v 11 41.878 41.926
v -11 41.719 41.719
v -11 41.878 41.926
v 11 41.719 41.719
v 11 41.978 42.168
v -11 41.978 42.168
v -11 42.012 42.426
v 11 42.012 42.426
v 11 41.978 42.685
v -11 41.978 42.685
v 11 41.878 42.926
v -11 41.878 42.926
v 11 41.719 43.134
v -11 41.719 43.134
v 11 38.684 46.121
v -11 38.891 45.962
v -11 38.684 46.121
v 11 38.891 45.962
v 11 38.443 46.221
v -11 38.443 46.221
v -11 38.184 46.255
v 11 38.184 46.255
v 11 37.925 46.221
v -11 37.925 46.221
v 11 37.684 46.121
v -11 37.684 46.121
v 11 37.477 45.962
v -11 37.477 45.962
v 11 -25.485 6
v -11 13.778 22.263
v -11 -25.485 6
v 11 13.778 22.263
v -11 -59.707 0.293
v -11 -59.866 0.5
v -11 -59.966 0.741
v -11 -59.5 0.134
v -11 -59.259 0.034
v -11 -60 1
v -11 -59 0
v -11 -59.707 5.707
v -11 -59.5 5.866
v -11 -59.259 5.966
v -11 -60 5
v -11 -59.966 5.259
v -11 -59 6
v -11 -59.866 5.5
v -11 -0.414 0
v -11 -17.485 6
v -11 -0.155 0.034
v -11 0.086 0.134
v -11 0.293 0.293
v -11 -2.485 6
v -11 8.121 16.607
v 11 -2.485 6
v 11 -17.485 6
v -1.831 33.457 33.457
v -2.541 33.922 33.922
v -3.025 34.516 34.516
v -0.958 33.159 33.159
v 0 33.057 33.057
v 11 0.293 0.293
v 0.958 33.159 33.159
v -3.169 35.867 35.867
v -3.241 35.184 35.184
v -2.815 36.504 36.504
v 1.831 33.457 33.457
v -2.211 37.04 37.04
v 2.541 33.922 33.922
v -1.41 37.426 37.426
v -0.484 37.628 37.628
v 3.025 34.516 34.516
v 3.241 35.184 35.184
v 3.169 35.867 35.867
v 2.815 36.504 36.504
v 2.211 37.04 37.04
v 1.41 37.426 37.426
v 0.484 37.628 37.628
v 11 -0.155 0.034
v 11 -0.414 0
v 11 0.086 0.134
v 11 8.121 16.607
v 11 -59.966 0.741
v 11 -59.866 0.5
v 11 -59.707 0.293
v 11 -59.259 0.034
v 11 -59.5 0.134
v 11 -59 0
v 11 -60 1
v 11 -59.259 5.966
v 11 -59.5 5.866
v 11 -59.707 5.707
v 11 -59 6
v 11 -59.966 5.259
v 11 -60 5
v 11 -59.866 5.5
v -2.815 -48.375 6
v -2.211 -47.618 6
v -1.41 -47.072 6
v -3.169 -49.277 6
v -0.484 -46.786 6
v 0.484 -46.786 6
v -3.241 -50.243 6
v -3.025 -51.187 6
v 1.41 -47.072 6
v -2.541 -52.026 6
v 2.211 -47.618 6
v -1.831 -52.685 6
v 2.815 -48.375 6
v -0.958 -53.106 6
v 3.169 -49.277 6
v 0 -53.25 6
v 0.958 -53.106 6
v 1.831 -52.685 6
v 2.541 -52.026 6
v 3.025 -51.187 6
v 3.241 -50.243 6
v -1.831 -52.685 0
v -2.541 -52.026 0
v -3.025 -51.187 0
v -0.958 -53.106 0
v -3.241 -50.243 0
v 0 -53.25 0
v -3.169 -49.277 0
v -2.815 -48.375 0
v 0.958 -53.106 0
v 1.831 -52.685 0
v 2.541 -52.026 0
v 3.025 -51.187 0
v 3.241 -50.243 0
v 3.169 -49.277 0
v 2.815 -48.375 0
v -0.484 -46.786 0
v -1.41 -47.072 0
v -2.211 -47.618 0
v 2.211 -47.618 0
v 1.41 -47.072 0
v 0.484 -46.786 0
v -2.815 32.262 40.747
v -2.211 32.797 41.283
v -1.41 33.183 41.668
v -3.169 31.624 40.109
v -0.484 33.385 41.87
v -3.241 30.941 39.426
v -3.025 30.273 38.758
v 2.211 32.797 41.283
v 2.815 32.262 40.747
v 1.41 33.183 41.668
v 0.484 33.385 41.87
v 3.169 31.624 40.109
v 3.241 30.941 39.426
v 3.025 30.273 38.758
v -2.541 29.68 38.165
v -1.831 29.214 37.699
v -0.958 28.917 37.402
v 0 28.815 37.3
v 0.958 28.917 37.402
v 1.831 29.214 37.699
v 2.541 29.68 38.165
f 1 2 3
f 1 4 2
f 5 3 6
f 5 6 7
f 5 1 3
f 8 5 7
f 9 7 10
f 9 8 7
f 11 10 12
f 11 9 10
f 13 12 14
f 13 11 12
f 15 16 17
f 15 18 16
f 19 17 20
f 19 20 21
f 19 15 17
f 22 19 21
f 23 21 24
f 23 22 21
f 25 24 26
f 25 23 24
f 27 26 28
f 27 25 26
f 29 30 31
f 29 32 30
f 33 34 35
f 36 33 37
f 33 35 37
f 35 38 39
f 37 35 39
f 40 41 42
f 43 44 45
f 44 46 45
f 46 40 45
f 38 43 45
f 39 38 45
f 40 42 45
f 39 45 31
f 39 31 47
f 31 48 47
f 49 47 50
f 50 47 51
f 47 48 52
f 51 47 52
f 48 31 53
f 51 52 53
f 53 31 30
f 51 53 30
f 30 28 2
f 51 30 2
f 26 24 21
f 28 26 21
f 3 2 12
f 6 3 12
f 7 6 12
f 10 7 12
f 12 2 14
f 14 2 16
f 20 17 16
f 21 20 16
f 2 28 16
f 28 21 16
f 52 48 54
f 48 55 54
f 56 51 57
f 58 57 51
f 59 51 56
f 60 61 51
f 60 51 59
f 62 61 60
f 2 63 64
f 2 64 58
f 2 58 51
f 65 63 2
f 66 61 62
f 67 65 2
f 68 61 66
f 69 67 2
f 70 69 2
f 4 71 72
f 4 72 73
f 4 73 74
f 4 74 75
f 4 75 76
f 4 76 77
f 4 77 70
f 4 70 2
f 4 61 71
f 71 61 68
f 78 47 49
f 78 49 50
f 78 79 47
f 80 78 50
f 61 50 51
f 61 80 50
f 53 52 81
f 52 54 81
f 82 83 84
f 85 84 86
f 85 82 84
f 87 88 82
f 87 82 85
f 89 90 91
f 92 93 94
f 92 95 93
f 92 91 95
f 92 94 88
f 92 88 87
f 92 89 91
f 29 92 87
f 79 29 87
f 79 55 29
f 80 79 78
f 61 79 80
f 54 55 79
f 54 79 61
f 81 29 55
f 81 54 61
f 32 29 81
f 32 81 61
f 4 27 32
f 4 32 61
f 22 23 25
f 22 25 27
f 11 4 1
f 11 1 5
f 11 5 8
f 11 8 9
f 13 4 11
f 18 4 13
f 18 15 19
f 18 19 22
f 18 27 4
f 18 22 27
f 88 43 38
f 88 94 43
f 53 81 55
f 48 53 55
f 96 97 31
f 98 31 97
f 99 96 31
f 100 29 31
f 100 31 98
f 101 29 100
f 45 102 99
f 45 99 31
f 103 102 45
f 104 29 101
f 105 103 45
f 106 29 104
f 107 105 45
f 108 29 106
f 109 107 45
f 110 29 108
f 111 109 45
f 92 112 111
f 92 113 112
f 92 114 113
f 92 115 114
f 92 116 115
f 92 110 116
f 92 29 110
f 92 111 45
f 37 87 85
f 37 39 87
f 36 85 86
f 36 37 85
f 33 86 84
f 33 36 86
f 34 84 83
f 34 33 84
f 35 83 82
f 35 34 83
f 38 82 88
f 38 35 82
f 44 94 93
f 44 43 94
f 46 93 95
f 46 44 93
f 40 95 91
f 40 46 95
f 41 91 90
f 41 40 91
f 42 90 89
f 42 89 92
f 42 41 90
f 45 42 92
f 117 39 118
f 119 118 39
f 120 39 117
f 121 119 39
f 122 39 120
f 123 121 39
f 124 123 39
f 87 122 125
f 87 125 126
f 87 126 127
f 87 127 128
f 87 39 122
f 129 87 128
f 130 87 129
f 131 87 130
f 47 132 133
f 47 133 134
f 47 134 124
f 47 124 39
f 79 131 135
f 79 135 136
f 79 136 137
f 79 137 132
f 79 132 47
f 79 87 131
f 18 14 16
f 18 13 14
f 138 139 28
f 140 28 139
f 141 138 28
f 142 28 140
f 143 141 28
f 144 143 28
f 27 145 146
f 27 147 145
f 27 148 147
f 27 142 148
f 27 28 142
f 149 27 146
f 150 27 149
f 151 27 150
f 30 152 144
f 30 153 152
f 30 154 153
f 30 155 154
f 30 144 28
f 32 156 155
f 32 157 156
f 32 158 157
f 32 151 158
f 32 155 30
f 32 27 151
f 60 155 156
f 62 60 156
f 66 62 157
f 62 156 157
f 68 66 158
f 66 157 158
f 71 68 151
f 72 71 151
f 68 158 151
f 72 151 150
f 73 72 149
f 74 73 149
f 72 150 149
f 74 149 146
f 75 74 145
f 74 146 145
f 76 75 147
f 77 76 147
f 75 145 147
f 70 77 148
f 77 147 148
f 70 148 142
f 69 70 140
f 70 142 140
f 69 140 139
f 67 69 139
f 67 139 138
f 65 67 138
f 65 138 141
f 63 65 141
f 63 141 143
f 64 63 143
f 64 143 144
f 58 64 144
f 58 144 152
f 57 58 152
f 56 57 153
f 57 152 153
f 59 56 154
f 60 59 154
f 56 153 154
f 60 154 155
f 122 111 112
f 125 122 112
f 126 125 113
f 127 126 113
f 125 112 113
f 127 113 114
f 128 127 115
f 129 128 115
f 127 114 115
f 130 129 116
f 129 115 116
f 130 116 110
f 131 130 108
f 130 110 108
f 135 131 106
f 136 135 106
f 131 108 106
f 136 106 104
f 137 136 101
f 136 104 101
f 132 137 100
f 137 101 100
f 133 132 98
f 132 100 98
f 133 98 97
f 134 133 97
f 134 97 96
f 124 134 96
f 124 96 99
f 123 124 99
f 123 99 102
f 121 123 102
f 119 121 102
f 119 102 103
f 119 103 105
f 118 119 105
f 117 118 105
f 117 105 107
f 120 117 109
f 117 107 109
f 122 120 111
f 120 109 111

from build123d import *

# Parameters (mm, degrees)
PAD_DEPTH       = 11
SKETCH001_R     = 3.25
POCKET_DEPTH    = 6
SKETCH002_R     = 3.25
POCKET001_DEPTH = 6
FILLET_R        = 1


with BuildPart() as part:
    # Sketch → Pad (new body, symmetric)
    with BuildSketch(Plane.YZ):
        Polygon((-60, 0), (0, 0), (42.4264068712, 42.4264068712), (38.1837661841, 46.6690475583), (13.7781745931, 22.2634559673), (-25.4852813742, 6), (-60, 6), align=None)
        Polygon((8.1213203436, 16.6066017178), (-17.4852813742, 6), (-2.4852813742, 6), align=None, mode=Mode.SUBTRACT)
    extrude(amount=PAD_DEPTH, both=True)

    # Sketch001 (on Face6 of Pad) → Pocket (cut)
    with BuildSketch(Plane(origin=(0, 0, 6), x_dir=(0, -1, 0), z_dir=(0, 0, 1))):
        with Locations((50, 0)):
            Circle(SKETCH001_R)
    extrude(amount=-POCKET_DEPTH, mode=Mode.SUBTRACT)

    # Sketch002 (on Face9 of Pocket) → Pocket001 (cut)
    with BuildSketch(Plane(origin=(0, -4.2426406871, 4.2426406871), x_dir=(0, -0.7071067812, -0.7071067812), z_dir=(0, -0.7071067812, 0.7071067812))):
        with Locations((-50, 0)):
            Circle(SKETCH002_R)
    extrude(amount=-POCKET001_DEPTH, mode=Mode.SUBTRACT)

    # Fillet
    fillet_edges = [part.edges().sort_by_distance(p)[0] for p in [
        (0, 0, 0),
        (0, -60, 0),
        (0, -60, 6),
        (0, 38.183766, 46.669048),
        (0, 42.426407, 42.426407),
    ]]
    fillet(fillet_edges, radius=FILLET_R)


solid = part.part
